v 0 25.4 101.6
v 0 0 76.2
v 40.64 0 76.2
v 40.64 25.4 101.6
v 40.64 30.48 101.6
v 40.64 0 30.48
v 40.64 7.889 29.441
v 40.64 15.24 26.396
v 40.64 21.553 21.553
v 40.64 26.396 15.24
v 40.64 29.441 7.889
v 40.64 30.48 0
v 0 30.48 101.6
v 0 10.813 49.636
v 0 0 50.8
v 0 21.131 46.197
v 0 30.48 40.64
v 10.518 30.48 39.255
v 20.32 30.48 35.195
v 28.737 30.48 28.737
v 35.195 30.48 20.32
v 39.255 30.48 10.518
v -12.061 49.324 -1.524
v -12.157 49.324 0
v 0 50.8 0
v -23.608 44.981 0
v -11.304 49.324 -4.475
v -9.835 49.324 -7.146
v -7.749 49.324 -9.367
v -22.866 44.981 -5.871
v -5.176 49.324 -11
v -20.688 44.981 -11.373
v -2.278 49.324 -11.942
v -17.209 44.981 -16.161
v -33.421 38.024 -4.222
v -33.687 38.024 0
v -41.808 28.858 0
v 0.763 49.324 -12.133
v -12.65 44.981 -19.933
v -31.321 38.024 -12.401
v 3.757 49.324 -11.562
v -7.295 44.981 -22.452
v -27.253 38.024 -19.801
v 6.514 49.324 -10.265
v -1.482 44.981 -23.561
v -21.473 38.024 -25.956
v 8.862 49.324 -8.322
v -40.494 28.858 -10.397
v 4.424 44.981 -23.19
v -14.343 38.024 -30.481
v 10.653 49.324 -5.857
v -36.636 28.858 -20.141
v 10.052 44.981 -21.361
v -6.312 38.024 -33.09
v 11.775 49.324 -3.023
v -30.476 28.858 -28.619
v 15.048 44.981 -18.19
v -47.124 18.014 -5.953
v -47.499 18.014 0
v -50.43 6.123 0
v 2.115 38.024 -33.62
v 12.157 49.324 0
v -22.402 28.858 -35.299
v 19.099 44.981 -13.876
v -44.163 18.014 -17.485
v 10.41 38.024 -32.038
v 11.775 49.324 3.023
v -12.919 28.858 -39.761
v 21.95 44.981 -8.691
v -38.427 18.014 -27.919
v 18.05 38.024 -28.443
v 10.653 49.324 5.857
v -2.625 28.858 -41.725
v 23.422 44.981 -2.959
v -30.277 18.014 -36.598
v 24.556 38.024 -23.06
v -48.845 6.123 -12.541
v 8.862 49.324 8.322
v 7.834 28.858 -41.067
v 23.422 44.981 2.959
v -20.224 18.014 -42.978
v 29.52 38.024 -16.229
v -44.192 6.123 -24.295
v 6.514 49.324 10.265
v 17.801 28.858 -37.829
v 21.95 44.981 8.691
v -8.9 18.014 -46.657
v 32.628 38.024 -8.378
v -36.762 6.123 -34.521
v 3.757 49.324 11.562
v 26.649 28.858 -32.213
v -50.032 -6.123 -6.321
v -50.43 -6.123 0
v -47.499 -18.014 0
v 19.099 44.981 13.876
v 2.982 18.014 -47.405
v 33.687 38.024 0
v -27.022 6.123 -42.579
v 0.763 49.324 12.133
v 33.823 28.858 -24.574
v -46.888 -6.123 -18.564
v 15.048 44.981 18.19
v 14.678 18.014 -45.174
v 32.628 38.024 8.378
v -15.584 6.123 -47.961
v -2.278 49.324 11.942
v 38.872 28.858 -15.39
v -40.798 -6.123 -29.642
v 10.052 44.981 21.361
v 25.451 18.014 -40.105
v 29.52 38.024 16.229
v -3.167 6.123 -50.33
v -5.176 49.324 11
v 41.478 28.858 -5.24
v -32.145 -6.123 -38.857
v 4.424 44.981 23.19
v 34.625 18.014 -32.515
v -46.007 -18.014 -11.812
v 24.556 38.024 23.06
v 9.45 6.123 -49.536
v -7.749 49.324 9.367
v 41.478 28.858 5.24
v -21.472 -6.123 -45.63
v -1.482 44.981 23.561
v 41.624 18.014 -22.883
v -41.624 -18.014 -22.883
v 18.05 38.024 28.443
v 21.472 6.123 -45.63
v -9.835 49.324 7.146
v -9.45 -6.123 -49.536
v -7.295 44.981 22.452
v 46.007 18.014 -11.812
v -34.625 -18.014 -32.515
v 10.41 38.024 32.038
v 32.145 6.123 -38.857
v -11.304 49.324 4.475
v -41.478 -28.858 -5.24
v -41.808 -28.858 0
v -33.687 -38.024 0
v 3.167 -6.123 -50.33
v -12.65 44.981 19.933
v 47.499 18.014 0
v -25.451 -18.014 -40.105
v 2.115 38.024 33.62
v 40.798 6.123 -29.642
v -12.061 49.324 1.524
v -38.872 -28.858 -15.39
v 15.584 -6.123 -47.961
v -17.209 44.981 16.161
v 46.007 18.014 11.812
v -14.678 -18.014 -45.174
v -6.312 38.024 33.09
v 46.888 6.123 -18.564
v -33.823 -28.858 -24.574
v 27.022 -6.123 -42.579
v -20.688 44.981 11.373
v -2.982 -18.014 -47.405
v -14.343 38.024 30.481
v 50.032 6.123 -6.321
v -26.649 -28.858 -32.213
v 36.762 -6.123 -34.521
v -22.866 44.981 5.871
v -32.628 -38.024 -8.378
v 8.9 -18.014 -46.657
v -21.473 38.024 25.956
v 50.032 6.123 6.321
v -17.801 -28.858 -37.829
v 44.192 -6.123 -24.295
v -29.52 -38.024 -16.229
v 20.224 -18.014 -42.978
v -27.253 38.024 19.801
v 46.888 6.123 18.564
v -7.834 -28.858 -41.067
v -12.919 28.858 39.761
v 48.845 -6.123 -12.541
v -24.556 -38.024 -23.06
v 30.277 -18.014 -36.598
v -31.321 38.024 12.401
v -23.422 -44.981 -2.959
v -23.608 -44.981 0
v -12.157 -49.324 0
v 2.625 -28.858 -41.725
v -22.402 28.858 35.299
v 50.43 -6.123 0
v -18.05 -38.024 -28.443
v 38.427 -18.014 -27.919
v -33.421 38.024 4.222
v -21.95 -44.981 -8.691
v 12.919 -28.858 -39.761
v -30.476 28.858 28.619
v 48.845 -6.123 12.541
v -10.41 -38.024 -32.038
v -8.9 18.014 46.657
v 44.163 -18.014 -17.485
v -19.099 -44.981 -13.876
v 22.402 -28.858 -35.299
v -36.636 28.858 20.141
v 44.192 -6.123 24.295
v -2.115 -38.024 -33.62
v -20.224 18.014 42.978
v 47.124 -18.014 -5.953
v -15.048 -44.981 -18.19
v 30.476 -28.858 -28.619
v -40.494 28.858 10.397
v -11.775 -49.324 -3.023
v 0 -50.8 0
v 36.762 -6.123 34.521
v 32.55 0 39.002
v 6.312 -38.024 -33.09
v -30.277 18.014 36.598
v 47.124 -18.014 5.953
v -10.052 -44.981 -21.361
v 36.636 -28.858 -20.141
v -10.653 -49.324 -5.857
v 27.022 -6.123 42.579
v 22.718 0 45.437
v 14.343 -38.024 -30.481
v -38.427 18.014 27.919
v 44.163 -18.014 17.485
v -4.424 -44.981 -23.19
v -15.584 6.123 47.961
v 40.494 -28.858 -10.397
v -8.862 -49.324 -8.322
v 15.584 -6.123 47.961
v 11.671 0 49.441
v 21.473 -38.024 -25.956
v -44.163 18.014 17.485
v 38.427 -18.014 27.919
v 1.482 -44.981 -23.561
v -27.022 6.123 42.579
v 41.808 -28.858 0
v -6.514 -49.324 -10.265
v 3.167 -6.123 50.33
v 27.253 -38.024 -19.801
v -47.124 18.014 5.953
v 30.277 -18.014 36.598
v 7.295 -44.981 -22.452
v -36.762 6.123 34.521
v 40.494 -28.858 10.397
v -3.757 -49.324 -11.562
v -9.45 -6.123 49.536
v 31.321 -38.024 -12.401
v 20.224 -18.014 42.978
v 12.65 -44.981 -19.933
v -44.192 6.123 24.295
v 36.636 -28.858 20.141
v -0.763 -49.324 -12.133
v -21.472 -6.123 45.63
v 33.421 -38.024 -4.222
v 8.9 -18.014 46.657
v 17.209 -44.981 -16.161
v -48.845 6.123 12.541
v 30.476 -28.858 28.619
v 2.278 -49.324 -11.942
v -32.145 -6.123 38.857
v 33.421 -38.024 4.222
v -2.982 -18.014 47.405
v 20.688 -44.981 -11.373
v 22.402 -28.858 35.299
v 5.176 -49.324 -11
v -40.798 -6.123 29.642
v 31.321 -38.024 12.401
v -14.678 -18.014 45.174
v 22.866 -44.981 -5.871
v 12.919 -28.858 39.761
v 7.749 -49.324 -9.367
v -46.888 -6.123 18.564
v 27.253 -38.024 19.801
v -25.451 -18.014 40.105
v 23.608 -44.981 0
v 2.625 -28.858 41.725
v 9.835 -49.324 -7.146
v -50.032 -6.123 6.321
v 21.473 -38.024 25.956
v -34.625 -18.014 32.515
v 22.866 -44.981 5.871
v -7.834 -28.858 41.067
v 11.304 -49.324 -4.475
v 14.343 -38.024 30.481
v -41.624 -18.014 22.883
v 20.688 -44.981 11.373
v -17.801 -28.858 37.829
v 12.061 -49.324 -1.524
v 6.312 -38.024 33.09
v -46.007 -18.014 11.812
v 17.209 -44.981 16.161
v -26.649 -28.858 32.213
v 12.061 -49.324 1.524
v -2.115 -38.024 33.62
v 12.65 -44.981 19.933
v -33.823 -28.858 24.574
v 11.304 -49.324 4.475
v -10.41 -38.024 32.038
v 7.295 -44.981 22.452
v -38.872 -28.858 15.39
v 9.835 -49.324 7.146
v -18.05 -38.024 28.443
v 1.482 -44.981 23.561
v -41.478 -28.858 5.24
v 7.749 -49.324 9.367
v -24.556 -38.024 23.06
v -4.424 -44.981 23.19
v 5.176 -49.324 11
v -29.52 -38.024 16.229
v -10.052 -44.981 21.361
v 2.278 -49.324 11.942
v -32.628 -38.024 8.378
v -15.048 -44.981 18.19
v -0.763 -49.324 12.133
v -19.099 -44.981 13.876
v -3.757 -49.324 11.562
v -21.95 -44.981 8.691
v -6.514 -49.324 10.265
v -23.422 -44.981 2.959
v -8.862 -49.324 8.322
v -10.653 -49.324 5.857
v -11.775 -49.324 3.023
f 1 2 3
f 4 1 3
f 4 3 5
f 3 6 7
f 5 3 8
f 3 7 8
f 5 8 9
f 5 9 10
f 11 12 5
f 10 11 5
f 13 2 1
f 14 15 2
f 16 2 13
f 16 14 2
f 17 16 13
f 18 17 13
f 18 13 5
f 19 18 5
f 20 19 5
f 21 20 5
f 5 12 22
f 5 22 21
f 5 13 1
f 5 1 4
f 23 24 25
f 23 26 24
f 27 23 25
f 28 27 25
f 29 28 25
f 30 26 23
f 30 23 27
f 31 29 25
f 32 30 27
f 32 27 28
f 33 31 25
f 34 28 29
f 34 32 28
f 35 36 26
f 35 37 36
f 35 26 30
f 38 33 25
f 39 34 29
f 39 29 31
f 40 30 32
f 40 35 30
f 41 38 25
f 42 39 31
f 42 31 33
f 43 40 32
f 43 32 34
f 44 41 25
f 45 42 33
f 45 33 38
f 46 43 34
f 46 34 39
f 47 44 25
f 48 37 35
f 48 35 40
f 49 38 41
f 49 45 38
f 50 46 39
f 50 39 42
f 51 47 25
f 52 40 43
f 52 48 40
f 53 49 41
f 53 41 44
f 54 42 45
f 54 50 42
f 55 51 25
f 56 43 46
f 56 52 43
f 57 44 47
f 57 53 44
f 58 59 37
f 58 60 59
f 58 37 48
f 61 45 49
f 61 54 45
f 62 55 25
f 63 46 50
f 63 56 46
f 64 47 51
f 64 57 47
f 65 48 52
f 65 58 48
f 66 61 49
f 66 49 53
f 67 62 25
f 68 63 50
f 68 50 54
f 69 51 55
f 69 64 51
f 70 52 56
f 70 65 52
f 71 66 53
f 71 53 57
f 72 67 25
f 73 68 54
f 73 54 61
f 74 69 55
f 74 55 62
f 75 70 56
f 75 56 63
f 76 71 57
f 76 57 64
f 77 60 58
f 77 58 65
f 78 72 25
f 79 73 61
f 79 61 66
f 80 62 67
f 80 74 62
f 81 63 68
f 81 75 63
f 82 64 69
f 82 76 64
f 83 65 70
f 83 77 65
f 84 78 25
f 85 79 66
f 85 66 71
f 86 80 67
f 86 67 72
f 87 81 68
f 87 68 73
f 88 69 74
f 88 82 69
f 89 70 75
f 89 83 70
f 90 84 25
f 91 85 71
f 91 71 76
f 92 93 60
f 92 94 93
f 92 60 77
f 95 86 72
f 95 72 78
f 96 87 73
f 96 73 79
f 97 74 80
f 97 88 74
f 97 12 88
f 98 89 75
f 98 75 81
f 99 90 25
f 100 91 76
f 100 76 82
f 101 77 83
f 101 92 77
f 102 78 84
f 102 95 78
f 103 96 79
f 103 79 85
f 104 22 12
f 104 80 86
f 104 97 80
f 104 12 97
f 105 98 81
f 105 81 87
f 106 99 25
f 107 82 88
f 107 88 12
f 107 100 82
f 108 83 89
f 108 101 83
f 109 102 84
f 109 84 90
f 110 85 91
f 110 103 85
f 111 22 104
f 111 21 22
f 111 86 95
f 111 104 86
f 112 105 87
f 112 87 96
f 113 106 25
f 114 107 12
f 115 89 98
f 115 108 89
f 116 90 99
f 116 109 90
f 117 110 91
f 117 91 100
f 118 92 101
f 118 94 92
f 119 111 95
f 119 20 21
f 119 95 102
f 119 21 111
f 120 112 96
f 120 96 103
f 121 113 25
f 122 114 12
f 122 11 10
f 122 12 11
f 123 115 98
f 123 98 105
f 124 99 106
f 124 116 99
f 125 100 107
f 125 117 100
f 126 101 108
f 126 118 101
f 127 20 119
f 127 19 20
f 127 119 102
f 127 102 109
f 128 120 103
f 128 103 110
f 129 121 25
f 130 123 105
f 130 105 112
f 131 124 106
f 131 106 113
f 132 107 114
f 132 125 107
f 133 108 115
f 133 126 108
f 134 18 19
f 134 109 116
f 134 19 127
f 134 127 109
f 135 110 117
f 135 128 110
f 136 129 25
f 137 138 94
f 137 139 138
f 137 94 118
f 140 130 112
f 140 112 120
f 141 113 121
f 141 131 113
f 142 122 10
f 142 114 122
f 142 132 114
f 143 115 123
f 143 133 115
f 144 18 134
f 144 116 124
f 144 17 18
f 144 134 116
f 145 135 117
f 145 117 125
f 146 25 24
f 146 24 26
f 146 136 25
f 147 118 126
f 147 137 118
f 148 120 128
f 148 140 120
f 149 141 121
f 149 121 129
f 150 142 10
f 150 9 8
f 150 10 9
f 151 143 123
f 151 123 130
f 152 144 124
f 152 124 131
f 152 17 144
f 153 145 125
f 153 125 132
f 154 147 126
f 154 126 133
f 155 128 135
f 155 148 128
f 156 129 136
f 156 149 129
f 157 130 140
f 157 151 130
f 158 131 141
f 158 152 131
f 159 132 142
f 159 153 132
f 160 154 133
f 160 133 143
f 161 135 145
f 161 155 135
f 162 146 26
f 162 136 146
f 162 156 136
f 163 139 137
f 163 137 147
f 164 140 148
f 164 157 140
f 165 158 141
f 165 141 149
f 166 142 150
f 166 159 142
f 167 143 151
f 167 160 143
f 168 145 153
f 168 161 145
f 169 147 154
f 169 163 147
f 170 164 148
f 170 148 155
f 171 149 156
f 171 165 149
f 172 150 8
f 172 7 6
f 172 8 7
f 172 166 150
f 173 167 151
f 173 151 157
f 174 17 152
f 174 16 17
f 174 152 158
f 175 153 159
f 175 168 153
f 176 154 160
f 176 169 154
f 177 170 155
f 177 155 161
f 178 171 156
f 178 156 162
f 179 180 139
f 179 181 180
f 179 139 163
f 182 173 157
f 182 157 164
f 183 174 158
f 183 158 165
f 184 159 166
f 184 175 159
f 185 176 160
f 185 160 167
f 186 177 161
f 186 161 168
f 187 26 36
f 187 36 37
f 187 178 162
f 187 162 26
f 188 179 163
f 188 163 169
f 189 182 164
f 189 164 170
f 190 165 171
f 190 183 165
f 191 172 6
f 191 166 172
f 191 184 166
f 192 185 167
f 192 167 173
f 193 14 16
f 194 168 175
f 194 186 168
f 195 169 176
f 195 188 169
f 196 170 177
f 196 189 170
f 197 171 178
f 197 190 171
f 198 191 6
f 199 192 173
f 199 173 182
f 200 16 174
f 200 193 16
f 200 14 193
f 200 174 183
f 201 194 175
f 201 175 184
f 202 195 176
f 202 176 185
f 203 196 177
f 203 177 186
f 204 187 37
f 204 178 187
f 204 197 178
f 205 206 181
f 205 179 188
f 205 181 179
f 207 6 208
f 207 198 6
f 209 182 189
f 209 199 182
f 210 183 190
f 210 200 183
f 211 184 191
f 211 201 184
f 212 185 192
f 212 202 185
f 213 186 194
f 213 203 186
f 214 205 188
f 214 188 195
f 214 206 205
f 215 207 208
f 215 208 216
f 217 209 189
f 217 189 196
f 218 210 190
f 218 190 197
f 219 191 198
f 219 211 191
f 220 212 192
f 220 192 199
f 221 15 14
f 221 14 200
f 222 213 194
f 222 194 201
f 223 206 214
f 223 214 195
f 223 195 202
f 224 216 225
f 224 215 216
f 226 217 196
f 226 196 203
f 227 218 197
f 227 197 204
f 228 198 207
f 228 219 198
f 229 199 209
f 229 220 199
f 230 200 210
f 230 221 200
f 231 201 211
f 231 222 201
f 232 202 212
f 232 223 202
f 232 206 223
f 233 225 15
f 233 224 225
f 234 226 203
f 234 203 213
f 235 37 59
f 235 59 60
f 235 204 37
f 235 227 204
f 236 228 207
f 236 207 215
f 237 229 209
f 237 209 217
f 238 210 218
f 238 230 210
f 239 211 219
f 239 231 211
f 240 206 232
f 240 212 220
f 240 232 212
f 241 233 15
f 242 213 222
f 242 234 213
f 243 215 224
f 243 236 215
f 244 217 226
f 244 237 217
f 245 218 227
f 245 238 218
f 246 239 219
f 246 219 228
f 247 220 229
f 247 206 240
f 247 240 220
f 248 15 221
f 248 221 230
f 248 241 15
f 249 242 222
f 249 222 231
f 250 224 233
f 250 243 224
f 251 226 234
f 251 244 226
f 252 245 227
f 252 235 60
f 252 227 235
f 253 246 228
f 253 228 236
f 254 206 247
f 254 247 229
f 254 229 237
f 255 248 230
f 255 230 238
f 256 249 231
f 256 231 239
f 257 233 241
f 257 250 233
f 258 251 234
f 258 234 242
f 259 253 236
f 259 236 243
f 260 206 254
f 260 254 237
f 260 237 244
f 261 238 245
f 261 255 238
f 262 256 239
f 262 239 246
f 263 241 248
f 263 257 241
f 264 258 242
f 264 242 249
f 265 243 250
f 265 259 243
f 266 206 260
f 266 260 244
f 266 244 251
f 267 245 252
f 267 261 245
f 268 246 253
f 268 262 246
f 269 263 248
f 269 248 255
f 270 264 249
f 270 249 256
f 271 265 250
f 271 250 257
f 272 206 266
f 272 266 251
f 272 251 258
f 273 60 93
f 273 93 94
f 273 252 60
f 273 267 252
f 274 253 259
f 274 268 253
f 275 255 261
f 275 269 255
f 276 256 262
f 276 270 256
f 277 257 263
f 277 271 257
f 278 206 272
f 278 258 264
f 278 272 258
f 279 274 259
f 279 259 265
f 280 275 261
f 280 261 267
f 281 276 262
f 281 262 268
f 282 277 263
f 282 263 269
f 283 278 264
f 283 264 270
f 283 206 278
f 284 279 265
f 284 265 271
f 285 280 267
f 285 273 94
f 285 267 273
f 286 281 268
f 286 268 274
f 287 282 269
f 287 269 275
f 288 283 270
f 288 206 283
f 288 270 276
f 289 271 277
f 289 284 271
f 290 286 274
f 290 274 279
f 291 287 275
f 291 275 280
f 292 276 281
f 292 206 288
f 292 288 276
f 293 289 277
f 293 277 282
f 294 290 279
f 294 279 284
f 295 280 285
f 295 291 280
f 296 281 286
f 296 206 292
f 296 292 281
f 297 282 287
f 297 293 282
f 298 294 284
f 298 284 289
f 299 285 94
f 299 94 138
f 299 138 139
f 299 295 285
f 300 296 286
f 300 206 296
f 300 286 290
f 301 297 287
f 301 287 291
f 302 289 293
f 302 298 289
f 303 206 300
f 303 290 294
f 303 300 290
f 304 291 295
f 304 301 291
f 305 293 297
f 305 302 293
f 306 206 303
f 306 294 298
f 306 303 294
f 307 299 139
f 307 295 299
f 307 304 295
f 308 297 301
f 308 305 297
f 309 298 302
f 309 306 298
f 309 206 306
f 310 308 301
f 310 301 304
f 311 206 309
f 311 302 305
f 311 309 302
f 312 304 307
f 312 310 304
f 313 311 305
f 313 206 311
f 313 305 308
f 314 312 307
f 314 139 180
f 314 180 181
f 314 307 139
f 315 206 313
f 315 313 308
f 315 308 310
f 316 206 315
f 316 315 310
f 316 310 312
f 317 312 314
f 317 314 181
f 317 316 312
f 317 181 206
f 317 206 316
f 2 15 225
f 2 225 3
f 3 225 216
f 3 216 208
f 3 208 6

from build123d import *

# Parameters (mm, degrees)
F2_W     = 40.64
F2_H     = 30.48
F3_DEPTH = 101.6
F4_SIZE  = 25.4


with BuildPart() as f1:
    # F0 (on Top) → F1 (revolve)
    with BuildSketch(Plane.XY):
        with BuildLine():
            Line((0, -50.8), (0, 50.8))
            ThreePointArc((0, 50.8), (-50.8, 0), (0, -50.8))
        make_face()
    revolve(axis=Axis((0, 0, 0), (0, -1, 0)))

    # F2 (on Top) → F3 (join)
    with BuildSketch(Plane.XY):
        with Locations((20.32, 15.24)):
            Rectangle(F2_W, F2_H)
    extrude(amount=F3_DEPTH)

    # F4
    f4_edges = [f1.edges().sort_by_distance(p)[0] for p in [
        (20.32, 0, 101.6),
    ]]
    chamfer(f4_edges, length=F4_SIZE)


solid = f1.part
